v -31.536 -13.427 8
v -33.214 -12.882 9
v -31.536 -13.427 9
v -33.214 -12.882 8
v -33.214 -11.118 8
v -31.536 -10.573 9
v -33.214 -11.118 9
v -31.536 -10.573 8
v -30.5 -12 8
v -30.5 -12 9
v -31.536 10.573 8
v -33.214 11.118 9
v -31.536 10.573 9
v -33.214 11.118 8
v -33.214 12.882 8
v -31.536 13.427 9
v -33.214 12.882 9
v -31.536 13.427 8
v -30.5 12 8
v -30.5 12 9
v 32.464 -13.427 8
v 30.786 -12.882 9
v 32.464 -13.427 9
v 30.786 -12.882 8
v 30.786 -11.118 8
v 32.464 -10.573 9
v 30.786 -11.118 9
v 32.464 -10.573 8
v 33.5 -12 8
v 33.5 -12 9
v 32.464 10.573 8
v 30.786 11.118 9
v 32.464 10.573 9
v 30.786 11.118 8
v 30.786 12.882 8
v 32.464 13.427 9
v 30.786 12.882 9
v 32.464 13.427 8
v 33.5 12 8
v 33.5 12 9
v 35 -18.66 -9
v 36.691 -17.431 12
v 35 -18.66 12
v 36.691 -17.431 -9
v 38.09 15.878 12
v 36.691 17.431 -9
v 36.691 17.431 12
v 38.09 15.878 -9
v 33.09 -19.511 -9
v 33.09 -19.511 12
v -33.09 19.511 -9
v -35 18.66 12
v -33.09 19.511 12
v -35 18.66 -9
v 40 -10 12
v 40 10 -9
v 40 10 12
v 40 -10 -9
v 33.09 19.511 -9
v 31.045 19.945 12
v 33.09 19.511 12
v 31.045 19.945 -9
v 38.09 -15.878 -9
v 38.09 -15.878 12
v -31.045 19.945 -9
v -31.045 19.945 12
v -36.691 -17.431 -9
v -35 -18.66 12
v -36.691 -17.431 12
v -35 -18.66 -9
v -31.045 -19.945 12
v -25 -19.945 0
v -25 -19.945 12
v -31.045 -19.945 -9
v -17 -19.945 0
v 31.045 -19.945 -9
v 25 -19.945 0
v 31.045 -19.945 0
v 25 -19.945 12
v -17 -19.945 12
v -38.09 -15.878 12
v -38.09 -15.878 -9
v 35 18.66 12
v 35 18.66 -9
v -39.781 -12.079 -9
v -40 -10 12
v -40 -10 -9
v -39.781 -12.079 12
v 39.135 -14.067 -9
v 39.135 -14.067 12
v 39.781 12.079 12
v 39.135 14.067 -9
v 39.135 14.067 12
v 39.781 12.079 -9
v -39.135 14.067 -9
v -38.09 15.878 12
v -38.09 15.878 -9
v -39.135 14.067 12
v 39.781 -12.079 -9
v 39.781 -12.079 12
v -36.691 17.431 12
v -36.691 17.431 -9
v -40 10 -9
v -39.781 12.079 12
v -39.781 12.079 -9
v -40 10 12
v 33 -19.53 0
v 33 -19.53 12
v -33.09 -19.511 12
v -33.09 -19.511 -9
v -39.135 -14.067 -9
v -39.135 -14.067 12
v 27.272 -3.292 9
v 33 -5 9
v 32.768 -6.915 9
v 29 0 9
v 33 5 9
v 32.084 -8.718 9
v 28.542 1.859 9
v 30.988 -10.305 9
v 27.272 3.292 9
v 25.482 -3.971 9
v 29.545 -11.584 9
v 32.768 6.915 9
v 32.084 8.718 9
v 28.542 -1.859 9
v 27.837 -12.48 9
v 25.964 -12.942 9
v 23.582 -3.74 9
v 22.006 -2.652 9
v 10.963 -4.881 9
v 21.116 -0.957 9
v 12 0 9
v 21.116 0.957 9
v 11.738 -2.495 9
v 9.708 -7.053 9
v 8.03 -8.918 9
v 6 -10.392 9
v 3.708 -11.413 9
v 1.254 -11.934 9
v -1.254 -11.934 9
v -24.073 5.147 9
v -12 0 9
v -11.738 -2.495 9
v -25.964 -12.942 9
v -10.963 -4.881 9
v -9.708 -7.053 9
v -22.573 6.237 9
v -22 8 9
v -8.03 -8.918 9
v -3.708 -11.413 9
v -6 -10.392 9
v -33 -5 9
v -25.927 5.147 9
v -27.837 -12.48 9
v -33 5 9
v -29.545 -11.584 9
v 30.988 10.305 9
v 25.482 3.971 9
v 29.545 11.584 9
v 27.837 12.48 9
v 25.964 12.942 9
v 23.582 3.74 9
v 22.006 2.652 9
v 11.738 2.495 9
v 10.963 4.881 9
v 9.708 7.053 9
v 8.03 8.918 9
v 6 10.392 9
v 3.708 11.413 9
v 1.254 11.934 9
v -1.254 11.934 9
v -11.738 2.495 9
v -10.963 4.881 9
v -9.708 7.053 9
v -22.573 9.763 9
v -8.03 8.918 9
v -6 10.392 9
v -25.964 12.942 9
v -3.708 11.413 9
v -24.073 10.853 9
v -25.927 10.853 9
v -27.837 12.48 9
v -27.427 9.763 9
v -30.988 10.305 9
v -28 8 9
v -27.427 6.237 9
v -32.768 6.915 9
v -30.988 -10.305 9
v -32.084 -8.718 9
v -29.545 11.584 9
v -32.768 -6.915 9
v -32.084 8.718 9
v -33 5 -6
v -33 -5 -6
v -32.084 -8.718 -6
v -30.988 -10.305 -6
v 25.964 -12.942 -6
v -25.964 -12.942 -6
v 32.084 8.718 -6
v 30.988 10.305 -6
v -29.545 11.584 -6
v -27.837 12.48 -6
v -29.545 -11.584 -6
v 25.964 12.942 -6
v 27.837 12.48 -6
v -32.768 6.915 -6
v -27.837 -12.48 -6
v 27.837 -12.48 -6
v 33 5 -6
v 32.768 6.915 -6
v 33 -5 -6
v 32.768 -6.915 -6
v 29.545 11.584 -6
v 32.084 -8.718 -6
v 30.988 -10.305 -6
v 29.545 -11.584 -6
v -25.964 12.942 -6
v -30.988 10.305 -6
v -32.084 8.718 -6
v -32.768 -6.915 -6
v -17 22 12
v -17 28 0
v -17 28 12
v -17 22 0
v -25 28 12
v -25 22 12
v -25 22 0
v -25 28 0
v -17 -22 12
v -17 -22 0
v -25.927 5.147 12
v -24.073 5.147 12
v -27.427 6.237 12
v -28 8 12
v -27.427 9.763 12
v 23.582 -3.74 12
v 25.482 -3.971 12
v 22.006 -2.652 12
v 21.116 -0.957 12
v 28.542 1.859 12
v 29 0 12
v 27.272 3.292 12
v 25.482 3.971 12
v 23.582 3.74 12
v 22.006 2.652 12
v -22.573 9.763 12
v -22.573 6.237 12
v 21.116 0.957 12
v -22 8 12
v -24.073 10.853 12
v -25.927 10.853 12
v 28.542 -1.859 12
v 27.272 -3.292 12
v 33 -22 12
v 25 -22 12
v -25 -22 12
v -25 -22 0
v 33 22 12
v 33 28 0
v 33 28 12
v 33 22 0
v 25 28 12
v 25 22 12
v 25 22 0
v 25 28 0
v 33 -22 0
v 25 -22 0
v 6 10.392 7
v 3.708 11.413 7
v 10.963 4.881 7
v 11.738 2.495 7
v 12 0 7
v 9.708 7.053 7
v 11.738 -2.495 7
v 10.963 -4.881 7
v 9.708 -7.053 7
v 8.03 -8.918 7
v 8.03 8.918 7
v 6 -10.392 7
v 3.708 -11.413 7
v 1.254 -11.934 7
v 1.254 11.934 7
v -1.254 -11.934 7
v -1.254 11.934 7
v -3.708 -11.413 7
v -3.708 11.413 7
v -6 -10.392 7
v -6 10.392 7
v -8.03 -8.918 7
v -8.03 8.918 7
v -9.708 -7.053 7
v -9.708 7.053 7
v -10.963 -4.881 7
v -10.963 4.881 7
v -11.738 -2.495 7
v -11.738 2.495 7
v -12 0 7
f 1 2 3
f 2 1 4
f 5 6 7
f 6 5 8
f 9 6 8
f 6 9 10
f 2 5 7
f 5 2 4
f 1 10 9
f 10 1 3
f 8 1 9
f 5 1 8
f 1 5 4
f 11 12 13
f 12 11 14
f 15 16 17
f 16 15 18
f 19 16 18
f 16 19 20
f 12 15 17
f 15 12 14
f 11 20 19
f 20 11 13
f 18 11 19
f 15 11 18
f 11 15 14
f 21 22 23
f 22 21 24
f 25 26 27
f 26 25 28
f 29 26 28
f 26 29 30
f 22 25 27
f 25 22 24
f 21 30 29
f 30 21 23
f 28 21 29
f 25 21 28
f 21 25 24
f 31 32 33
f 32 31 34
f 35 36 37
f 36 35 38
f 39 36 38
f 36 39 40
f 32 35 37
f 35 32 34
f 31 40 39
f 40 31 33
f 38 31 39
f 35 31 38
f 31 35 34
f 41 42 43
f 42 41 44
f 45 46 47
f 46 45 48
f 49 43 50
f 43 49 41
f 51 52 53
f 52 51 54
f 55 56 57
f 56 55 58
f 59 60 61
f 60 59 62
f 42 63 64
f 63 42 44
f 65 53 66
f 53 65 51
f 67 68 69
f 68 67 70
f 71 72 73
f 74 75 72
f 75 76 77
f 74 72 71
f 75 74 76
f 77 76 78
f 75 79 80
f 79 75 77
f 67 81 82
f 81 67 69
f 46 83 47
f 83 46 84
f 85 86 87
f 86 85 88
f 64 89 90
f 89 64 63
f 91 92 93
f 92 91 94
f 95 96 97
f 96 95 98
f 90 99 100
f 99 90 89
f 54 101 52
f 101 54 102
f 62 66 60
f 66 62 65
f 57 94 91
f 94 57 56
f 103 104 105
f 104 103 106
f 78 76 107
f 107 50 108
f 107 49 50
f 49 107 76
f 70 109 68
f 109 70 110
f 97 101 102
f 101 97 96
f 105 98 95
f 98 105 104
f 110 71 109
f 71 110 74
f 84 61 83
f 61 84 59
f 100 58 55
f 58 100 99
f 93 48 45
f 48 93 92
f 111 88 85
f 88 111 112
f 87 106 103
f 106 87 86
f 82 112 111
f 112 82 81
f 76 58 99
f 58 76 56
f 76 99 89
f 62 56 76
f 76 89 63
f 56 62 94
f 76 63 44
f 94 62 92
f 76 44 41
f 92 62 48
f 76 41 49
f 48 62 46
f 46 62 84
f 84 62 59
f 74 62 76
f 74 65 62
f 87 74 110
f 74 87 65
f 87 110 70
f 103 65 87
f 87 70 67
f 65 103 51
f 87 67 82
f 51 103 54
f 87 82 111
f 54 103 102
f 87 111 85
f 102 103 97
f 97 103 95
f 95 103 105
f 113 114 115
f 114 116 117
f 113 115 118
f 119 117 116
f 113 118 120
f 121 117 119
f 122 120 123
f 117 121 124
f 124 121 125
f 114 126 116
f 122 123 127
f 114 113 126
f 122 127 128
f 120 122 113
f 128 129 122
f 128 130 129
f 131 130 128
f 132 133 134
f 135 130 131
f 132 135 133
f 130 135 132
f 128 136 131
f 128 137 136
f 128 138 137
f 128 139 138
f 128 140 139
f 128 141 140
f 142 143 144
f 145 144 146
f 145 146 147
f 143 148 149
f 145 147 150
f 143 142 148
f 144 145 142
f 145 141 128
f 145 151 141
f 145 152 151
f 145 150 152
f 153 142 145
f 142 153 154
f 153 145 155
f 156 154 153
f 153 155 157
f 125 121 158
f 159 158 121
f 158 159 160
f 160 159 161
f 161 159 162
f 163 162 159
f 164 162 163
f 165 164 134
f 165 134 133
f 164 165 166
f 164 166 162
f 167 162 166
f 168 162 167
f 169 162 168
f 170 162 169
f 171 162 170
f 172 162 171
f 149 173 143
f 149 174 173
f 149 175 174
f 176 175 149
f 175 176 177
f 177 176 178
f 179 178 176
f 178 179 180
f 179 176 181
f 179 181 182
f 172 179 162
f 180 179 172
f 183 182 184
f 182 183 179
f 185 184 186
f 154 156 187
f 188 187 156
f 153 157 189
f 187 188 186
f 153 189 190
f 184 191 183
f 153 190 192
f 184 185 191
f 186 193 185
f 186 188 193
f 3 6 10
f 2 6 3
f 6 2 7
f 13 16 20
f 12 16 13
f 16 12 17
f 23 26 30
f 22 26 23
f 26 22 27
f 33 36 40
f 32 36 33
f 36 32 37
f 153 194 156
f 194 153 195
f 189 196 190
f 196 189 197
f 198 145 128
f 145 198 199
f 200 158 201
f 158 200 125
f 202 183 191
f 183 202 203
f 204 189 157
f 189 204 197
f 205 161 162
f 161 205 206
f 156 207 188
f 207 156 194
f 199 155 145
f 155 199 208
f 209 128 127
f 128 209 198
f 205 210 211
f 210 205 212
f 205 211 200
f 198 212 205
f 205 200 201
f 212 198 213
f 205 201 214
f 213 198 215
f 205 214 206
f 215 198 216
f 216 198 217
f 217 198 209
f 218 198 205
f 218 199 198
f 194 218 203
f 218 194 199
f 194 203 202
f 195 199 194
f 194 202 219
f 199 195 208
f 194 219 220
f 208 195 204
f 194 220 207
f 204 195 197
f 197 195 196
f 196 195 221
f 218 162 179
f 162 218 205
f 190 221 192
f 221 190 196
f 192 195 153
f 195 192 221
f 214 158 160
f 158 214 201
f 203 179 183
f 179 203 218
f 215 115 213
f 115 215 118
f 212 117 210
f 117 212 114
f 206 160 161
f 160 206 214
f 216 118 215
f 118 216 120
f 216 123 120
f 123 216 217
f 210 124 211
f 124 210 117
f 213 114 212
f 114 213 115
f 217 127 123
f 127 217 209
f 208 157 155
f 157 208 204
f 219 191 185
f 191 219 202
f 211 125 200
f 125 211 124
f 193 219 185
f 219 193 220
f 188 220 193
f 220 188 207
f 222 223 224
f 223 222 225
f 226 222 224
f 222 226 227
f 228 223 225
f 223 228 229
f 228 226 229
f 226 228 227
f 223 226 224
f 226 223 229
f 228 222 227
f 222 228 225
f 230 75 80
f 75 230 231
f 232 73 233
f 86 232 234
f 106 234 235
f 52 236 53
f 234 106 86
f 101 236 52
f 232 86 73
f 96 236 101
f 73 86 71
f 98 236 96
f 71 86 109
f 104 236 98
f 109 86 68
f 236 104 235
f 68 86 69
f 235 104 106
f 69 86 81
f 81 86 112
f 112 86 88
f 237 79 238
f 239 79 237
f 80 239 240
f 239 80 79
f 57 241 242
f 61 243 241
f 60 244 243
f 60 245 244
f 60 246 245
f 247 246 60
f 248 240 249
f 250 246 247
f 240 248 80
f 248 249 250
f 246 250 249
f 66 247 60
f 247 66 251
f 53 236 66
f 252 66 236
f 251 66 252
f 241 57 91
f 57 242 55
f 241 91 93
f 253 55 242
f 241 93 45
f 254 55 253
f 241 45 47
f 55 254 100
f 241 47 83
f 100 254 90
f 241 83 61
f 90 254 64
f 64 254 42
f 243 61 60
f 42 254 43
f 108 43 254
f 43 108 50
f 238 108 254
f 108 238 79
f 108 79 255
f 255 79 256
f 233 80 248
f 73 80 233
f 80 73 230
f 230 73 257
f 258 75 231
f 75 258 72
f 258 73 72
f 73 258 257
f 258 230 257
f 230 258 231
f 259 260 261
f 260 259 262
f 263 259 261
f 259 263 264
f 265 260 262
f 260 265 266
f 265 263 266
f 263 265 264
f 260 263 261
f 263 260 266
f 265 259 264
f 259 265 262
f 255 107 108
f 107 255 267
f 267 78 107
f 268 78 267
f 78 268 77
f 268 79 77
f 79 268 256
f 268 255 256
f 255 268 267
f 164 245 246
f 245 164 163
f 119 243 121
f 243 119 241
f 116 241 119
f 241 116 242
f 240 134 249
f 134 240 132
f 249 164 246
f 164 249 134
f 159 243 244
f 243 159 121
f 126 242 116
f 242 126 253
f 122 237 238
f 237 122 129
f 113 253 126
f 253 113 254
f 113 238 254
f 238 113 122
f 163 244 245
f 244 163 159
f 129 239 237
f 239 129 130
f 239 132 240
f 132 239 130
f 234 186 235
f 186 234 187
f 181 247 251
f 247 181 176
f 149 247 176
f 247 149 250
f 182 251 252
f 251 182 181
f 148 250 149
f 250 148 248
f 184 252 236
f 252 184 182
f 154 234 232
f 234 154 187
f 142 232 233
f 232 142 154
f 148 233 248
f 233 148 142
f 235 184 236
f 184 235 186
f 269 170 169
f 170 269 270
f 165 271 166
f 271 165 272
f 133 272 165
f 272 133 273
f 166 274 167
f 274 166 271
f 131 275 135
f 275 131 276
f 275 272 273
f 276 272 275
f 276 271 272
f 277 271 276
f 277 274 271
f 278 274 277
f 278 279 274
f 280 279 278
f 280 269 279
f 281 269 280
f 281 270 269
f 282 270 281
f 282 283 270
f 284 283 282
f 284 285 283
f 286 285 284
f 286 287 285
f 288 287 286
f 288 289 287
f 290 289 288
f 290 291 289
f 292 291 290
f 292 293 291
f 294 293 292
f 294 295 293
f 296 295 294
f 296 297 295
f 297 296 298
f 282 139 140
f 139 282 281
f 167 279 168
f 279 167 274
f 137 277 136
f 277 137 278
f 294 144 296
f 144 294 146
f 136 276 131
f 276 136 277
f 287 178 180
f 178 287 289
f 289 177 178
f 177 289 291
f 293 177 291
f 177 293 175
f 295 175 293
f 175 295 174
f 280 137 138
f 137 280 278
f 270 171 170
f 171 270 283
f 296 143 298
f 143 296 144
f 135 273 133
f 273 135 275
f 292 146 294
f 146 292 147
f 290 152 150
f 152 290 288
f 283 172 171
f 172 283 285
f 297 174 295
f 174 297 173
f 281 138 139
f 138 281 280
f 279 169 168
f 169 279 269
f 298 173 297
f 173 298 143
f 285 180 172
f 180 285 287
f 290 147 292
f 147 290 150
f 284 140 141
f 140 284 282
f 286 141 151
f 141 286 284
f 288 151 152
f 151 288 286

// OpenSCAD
/**
 * GPS Dog Collar - 3D Enclosure Design
 * OpenSCAD script
 * 
 * Features:
 * - Waterproof design
 * - Shock resistant
 * - Comfortable for dogs
 * - USB-C charging
 * - LED indicator window
 * - GPS antenna clearance
 */

// ============== PARAMETERS ==============
COLLAR_WIDTH = 40;     // mm
COLLAR_LENGTH = 80;    // mm  
COLLAR_HEIGHT = 18;    // mm
WALL_THICKNESS = 3;    // mm

// Component dimensions
ESP32_SIZE = [55, 35, 3];
GPS_SIZE = [25, 25, 8];
BATTERY_SIZE = [50, 30, 8];

// ============== MAIN ENCLOSURE ==============
module main_body() {
  difference() {
    // Outer shell with rounded corners
    hull() {
      translate([COLLAR_LENGTH/2 - 10, COLLAR_WIDTH/2 - 10, 0]) 
        cylinder(r=10, h=COLLAR_HEIGHT, center=true);
      translate([COLLAR_LENGTH/2 - 10, -COLLAR_WIDTH/2 + 10, 0]) 
        cylinder(r=10, h=COLLAR_HEIGHT, center=true);
      translate([-COLLAR_LENGTH/2 + 10, COLLAR_WIDTH/2 - 10, 0]) 
        cylinder(r=10, h=COLLAR_HEIGHT, center=true);
      translate([-COLLAR_LENGTH/2 + 10, -COLLAR_WIDTH/2 + 10, 0]) 
        cylinder(r=10, h=COLLAR_HEIGHT, center=true);
    }
    
    // Inner cavity
    translate([0, 0, WALL_THICKNESS]) {
      hull() {
        translate([COLLAR_LENGTH/2 - 15, COLLAR_WIDTH/2 - 15, 0]) 
          cylinder(r=8, h=COLLAR_HEIGHT, center=true);
        translate([COLLAR_LENGTH/2 - 15, -COLLAR_WIDTH/2 + 15, 0]) 
          cylinder(r=8, h=COLLAR_HEIGHT, center=true);
        translate([-COLLAR_LENGTH/2 + 15, COLLAR_WIDTH/2 - 15, 0]) 
          cylinder(r=8, h=COLLAR_HEIGHT, center=true);
        translate([-COLLAR_LENGTH/2 + 15, -COLLAR_WIDTH/2 + 15, 0]) 
          cylinder(r=8, h=COLLAR_HEIGHT, center=true);
      }
    }
    
    // Lid screws (4 corners)
    for (x = [-COLLAR_LENGTH/2 + 8, COLLAR_LENGTH/2 - 8]) {
      for (y = [-COLLAR_WIDTH/2 + 8, COLLAR_WIDTH/2 - 8]) {
        translate([x, y, COLLAR_HEIGHT/2]) cylinder(r=1.5, h=2, center=true);
      }
    }
  }
}

// ============== LID ==============
module lid() {
  difference() {
    hull() {
      translate([COLLAR_LENGTH/2 - 10, COLLAR_WIDTH/2 - 10, 0]) 
        cylinder(r=10, h=WALL_THICKNESS, center=true);
      translate([COLLAR_LENGTH/2 - 10, -COLLAR_WIDTH/2 + 10, 0]) 
        cylinder(r=10, h=WALL_THICKNESS, center=true);
      translate([-COLLAR_LENGTH/2 + 10, COLLAR_WIDTH/2 - 10, 0]) 
        cylinder(r=10, h=WALL_THICKNESS, center=true);
      translate([-COLLAR_LENGTH/2 + 10, -COLLAR_WIDTH/2 + 10, 0]) 
        cylinder(r=10, h=WALL_THICKNESS, center=true);
    }
    
    // LED indicator window
    translate([COLLAR_LENGTH/2 - 15, 0, 0]) {
      cylinder(r=4, h=WALL_THICKNESS + 1, center=true);
    }
    
    // Reset button hole
    translate([-COLLAR_LENGTH/2 + 15, COLLAR_WIDTH/2 - 12, 0]) {
      cylinder(r=3, h=WALL_THICKNESS + 1, center=true);
    }
  }
}

// ============== USB-C CHARGE PORT ==============
module charge_port() {
  // USB-C receptacle cutout
  translate([0, -COLLAR_WIDTH/2 + 5, COLLAR_HEIGHT/2]) {
    cube([10, 4, 3], center=true);
  }
}

// ============== GPS ANTENNA AREA ==============
module gps_antenna_area() {
  // Top area for GPS antenna - thin wall for signal
  translate([0, 0, COLLAR_HEIGHT/2 - 1]) {
    cylinder(r=12, h=2, center=true);
  }
}

// ============== BATTERY COMPARTMENT ==============
module battery_compartment() {
  translate([0, 10, 0]) {
    cube([BATTERY_SIZE[0] + 2, BATTERY_SIZE[1] + 2, BATTERY_SIZE[2]], center=true);
  }
}

// ============== STRAP MOUNTS ==============
module strap_mounts() {
  // Strap attachment points on sides
  for (x = [-COLLAR_LENGTH/2 + 15, COLLAR_LENGTH/2 - 15]) {
    translate([x, COLLAR_WIDTH/2 + 2, 0]) {
      cube([8, 6, 12]);
    }
    translate([x, -COLLAR_WIDTH/2 - 2, 0]) {
      cube([8, 6, 12]);
    }
  }
}

// ============== ASSEMBLY ==============
module collar_assembly() {
  // Main body
  color([0.2, 0.2, 0.2]) main_body();
  
  // Charge port
  color([0.3, 0.3, 0.3]) charge_port();
  
  // Strap mounts
  color([0.25, 0.25, 0.25]) strap_mounts();
  
  // GPS antenna area
  color([0.15, 0.15, 0.15, 0.7]) gps_antenna_area();
  
  // Lid (separate part)
  color([0.3, 0.3, 0.3]) translate([0, 0, COLLAR_HEIGHT/2 + WALL_THICKNESS/2]) {
    lid();
  }
}

// ============== PRINT LAYOUT ==============
module print_parts() {
  // Main body (bottom)
  translate([0, 0, 0]) main_body();
  
  // Lid (top)
  translate([0, COLLAR_WIDTH + 20, 0]) lid();
  
  // Strap mounts
  translate([COLLAR_LENGTH + 15, 0, 0]) strap_mounts();
}

// Render the assembly
collar_assembly();

// For 3D printing, uncomment:
// print_parts();

// ============== DIMENSIONS ==============
echo("=== GPS Dog Collar Dimensions ===");
echo(str("Length: ", COLLAR_LENGTH, "mm"));
echo(str("Width: ", COLLAR_WIDTH, "mm"));
echo(str("Height: ", COLLAR_HEIGHT, "mm"));
echo(str("Wall Thickness: ", WALL_THICKNESS, "mm"));
echo("");
echo("=== Component Clearance ===");
echo(str("ESP32: ", ESP32_SIZE[0], "x", ESP32_SIZE[1], "mm"));
echo(str("GPS Module: ", GPS_SIZE[0], "x", GPS_SIZE[1], "mm"));
echo(str("Battery: ", BATTERY_SIZE[0], "x", BATTERY_SIZE[1], "x", BATTERY_SIZE[2], "mm"));
